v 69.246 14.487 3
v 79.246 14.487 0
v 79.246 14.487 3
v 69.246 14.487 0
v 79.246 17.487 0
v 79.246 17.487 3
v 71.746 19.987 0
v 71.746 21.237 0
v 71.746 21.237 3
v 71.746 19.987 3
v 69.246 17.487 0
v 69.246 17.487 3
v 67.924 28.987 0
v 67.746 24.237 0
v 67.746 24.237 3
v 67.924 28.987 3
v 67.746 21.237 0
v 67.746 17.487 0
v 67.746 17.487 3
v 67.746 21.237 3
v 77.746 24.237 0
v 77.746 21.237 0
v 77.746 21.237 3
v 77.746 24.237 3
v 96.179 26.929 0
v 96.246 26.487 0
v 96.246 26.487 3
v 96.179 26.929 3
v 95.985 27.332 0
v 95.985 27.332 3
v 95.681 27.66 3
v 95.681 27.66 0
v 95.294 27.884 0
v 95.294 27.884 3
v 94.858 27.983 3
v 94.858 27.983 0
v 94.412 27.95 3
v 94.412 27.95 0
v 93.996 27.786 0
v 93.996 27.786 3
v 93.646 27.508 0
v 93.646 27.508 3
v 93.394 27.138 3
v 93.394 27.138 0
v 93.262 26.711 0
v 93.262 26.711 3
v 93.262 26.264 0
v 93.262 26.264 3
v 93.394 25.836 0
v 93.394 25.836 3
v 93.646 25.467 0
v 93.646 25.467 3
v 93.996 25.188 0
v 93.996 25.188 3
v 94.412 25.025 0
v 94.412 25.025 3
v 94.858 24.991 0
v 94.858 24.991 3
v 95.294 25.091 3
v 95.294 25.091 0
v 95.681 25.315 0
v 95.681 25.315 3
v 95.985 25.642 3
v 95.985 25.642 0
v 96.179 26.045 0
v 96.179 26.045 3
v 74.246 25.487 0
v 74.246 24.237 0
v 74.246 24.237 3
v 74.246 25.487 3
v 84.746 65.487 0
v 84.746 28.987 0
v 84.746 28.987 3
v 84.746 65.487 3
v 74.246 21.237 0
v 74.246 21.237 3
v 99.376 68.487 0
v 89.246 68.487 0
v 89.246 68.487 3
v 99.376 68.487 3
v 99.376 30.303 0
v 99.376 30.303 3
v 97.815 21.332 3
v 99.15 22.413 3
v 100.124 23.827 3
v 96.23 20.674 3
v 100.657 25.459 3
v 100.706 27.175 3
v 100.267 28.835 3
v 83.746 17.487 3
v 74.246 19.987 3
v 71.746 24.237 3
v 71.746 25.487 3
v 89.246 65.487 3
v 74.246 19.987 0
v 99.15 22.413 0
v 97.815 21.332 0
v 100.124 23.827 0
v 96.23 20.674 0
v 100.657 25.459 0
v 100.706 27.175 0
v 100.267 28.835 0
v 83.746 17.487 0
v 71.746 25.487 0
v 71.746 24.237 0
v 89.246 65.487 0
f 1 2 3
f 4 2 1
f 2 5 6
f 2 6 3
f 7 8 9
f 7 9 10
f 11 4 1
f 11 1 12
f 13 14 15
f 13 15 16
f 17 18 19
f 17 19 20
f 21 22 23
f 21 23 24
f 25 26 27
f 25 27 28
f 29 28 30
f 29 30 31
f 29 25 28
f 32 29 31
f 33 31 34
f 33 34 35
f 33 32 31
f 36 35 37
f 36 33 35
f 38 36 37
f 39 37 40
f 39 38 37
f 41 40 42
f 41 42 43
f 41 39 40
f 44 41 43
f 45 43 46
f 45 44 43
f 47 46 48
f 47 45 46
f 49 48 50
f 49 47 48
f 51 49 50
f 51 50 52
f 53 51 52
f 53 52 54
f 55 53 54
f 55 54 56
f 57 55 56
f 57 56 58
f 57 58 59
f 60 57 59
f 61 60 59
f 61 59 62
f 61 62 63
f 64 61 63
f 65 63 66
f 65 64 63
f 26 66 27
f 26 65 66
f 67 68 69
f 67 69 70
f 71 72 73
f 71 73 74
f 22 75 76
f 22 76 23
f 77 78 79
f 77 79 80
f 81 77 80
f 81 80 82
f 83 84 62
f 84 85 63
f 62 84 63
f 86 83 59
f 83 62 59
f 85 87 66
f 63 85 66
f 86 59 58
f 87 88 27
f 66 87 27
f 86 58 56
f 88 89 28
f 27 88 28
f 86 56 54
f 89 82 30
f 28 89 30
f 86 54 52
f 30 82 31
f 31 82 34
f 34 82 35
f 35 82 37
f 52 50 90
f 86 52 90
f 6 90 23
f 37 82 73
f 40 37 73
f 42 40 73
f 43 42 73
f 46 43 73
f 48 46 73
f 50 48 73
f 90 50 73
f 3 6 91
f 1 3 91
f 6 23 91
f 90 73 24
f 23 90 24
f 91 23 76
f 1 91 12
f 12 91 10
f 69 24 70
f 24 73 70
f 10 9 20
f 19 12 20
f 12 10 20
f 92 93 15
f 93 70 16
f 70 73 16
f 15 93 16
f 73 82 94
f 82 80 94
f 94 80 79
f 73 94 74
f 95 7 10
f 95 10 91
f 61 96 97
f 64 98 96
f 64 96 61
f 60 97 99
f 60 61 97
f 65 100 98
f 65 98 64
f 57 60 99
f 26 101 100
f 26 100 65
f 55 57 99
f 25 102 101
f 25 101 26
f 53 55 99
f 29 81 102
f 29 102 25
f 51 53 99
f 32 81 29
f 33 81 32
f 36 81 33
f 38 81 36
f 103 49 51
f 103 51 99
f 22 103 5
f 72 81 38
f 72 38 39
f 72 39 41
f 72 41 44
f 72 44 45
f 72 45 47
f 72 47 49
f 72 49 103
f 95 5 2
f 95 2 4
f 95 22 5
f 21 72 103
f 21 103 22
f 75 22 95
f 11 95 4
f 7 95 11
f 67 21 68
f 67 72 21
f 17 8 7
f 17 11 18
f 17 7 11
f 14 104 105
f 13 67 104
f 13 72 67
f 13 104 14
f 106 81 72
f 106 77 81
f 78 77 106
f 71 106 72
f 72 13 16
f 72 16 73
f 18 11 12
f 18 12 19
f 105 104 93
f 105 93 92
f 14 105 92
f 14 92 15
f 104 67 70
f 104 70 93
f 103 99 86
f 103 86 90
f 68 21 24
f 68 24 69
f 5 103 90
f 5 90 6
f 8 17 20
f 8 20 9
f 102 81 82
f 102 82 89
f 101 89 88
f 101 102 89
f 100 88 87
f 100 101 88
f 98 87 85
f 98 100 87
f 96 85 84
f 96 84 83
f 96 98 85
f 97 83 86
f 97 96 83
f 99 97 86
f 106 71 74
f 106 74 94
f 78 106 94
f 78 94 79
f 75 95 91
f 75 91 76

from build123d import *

# Parameters (mm, degrees)
MODEL_R             = 1.500000002
BOSS_EXTRUDE1_DEPTH = 3


with BuildPart() as part:
    # Model → Boss-Extrude1 (new body)
    with BuildSketch(Plane.XY):
        with BuildLine():
            Line((67.745687083, 17.48726701), (67.745687083, 21.23726701))
            Line((67.745687083, 21.23726701), (71.745687083, 21.23726701))
            Line((71.745687083, 21.23726701), (71.745687083, 19.98726701))
            Line((71.745687083, 19.98726701), (74.245687083, 19.98726701))
            Line((74.245687083, 19.98726701), (74.245687083, 21.23726701))
            Line((74.245687083, 21.23726701), (77.745687083, 21.23726701))
            Line((77.745687083, 21.23726701), (77.745687083, 24.23726701))
            Line((77.745687083, 24.23726701), (74.245687083, 24.23726701))
            Line((74.245687083, 24.23726701), (74.245687083, 25.48726701))
            Line((74.245687083, 25.48726701), (71.745687083, 25.48726701))
            Line((71.745687083, 25.48726701), (71.745687083, 24.23726701))
            Line((71.745687083, 24.23726701), (67.745687083, 24.23726701))
            Line((67.745687083, 24.23726701), (67.924311205, 28.98726701))
            Line((67.924311205, 28.98726701), (68.995687083, 28.98726701))
            Line((68.995687083, 28.98726701), (84.745617476, 28.98726701))
            Line((84.745617476, 28.98726701), (84.745617476, 65.48726701))
            Line((84.745617476, 65.48726701), (89.245617476, 65.48726701))
            Line((89.245617476, 65.48726701), (89.245617476, 68.48726701))
            Line((89.245617476, 68.48726701), (99.376117267, 68.48726701))
            Line((99.376117267, 68.48726701), (99.376117267, 65.487488154))
            Line((99.376117267, 65.487488154), (99.376117267, 30.302957894))
            ThreePointArc((99.376117267, 30.302957894), (100.4489582, 24.623653509), (96.229587083, 20.67366701))
            Line((96.229587083, 20.67366701), (83.745687083, 17.48726701))
            Line((83.745687083, 17.48726701), (79.245687083, 17.48726701))
            Line((79.245687083, 17.48726701), (79.245687083, 14.48726701))
            Line((79.245687083, 14.48726701), (69.245690135, 14.48726701))
            Line((69.245690135, 14.48726701), (69.245687083, 17.48726701))
            Line((69.245687083, 17.48726701), (67.745687083, 17.48726701))
        make_face()
        with Locations((94.745687081, 26.487267012)):
            Circle(MODEL_R, mode=Mode.SUBTRACT)
    extrude(amount=BOSS_EXTRUDE1_DEPTH)


solid = part.part
